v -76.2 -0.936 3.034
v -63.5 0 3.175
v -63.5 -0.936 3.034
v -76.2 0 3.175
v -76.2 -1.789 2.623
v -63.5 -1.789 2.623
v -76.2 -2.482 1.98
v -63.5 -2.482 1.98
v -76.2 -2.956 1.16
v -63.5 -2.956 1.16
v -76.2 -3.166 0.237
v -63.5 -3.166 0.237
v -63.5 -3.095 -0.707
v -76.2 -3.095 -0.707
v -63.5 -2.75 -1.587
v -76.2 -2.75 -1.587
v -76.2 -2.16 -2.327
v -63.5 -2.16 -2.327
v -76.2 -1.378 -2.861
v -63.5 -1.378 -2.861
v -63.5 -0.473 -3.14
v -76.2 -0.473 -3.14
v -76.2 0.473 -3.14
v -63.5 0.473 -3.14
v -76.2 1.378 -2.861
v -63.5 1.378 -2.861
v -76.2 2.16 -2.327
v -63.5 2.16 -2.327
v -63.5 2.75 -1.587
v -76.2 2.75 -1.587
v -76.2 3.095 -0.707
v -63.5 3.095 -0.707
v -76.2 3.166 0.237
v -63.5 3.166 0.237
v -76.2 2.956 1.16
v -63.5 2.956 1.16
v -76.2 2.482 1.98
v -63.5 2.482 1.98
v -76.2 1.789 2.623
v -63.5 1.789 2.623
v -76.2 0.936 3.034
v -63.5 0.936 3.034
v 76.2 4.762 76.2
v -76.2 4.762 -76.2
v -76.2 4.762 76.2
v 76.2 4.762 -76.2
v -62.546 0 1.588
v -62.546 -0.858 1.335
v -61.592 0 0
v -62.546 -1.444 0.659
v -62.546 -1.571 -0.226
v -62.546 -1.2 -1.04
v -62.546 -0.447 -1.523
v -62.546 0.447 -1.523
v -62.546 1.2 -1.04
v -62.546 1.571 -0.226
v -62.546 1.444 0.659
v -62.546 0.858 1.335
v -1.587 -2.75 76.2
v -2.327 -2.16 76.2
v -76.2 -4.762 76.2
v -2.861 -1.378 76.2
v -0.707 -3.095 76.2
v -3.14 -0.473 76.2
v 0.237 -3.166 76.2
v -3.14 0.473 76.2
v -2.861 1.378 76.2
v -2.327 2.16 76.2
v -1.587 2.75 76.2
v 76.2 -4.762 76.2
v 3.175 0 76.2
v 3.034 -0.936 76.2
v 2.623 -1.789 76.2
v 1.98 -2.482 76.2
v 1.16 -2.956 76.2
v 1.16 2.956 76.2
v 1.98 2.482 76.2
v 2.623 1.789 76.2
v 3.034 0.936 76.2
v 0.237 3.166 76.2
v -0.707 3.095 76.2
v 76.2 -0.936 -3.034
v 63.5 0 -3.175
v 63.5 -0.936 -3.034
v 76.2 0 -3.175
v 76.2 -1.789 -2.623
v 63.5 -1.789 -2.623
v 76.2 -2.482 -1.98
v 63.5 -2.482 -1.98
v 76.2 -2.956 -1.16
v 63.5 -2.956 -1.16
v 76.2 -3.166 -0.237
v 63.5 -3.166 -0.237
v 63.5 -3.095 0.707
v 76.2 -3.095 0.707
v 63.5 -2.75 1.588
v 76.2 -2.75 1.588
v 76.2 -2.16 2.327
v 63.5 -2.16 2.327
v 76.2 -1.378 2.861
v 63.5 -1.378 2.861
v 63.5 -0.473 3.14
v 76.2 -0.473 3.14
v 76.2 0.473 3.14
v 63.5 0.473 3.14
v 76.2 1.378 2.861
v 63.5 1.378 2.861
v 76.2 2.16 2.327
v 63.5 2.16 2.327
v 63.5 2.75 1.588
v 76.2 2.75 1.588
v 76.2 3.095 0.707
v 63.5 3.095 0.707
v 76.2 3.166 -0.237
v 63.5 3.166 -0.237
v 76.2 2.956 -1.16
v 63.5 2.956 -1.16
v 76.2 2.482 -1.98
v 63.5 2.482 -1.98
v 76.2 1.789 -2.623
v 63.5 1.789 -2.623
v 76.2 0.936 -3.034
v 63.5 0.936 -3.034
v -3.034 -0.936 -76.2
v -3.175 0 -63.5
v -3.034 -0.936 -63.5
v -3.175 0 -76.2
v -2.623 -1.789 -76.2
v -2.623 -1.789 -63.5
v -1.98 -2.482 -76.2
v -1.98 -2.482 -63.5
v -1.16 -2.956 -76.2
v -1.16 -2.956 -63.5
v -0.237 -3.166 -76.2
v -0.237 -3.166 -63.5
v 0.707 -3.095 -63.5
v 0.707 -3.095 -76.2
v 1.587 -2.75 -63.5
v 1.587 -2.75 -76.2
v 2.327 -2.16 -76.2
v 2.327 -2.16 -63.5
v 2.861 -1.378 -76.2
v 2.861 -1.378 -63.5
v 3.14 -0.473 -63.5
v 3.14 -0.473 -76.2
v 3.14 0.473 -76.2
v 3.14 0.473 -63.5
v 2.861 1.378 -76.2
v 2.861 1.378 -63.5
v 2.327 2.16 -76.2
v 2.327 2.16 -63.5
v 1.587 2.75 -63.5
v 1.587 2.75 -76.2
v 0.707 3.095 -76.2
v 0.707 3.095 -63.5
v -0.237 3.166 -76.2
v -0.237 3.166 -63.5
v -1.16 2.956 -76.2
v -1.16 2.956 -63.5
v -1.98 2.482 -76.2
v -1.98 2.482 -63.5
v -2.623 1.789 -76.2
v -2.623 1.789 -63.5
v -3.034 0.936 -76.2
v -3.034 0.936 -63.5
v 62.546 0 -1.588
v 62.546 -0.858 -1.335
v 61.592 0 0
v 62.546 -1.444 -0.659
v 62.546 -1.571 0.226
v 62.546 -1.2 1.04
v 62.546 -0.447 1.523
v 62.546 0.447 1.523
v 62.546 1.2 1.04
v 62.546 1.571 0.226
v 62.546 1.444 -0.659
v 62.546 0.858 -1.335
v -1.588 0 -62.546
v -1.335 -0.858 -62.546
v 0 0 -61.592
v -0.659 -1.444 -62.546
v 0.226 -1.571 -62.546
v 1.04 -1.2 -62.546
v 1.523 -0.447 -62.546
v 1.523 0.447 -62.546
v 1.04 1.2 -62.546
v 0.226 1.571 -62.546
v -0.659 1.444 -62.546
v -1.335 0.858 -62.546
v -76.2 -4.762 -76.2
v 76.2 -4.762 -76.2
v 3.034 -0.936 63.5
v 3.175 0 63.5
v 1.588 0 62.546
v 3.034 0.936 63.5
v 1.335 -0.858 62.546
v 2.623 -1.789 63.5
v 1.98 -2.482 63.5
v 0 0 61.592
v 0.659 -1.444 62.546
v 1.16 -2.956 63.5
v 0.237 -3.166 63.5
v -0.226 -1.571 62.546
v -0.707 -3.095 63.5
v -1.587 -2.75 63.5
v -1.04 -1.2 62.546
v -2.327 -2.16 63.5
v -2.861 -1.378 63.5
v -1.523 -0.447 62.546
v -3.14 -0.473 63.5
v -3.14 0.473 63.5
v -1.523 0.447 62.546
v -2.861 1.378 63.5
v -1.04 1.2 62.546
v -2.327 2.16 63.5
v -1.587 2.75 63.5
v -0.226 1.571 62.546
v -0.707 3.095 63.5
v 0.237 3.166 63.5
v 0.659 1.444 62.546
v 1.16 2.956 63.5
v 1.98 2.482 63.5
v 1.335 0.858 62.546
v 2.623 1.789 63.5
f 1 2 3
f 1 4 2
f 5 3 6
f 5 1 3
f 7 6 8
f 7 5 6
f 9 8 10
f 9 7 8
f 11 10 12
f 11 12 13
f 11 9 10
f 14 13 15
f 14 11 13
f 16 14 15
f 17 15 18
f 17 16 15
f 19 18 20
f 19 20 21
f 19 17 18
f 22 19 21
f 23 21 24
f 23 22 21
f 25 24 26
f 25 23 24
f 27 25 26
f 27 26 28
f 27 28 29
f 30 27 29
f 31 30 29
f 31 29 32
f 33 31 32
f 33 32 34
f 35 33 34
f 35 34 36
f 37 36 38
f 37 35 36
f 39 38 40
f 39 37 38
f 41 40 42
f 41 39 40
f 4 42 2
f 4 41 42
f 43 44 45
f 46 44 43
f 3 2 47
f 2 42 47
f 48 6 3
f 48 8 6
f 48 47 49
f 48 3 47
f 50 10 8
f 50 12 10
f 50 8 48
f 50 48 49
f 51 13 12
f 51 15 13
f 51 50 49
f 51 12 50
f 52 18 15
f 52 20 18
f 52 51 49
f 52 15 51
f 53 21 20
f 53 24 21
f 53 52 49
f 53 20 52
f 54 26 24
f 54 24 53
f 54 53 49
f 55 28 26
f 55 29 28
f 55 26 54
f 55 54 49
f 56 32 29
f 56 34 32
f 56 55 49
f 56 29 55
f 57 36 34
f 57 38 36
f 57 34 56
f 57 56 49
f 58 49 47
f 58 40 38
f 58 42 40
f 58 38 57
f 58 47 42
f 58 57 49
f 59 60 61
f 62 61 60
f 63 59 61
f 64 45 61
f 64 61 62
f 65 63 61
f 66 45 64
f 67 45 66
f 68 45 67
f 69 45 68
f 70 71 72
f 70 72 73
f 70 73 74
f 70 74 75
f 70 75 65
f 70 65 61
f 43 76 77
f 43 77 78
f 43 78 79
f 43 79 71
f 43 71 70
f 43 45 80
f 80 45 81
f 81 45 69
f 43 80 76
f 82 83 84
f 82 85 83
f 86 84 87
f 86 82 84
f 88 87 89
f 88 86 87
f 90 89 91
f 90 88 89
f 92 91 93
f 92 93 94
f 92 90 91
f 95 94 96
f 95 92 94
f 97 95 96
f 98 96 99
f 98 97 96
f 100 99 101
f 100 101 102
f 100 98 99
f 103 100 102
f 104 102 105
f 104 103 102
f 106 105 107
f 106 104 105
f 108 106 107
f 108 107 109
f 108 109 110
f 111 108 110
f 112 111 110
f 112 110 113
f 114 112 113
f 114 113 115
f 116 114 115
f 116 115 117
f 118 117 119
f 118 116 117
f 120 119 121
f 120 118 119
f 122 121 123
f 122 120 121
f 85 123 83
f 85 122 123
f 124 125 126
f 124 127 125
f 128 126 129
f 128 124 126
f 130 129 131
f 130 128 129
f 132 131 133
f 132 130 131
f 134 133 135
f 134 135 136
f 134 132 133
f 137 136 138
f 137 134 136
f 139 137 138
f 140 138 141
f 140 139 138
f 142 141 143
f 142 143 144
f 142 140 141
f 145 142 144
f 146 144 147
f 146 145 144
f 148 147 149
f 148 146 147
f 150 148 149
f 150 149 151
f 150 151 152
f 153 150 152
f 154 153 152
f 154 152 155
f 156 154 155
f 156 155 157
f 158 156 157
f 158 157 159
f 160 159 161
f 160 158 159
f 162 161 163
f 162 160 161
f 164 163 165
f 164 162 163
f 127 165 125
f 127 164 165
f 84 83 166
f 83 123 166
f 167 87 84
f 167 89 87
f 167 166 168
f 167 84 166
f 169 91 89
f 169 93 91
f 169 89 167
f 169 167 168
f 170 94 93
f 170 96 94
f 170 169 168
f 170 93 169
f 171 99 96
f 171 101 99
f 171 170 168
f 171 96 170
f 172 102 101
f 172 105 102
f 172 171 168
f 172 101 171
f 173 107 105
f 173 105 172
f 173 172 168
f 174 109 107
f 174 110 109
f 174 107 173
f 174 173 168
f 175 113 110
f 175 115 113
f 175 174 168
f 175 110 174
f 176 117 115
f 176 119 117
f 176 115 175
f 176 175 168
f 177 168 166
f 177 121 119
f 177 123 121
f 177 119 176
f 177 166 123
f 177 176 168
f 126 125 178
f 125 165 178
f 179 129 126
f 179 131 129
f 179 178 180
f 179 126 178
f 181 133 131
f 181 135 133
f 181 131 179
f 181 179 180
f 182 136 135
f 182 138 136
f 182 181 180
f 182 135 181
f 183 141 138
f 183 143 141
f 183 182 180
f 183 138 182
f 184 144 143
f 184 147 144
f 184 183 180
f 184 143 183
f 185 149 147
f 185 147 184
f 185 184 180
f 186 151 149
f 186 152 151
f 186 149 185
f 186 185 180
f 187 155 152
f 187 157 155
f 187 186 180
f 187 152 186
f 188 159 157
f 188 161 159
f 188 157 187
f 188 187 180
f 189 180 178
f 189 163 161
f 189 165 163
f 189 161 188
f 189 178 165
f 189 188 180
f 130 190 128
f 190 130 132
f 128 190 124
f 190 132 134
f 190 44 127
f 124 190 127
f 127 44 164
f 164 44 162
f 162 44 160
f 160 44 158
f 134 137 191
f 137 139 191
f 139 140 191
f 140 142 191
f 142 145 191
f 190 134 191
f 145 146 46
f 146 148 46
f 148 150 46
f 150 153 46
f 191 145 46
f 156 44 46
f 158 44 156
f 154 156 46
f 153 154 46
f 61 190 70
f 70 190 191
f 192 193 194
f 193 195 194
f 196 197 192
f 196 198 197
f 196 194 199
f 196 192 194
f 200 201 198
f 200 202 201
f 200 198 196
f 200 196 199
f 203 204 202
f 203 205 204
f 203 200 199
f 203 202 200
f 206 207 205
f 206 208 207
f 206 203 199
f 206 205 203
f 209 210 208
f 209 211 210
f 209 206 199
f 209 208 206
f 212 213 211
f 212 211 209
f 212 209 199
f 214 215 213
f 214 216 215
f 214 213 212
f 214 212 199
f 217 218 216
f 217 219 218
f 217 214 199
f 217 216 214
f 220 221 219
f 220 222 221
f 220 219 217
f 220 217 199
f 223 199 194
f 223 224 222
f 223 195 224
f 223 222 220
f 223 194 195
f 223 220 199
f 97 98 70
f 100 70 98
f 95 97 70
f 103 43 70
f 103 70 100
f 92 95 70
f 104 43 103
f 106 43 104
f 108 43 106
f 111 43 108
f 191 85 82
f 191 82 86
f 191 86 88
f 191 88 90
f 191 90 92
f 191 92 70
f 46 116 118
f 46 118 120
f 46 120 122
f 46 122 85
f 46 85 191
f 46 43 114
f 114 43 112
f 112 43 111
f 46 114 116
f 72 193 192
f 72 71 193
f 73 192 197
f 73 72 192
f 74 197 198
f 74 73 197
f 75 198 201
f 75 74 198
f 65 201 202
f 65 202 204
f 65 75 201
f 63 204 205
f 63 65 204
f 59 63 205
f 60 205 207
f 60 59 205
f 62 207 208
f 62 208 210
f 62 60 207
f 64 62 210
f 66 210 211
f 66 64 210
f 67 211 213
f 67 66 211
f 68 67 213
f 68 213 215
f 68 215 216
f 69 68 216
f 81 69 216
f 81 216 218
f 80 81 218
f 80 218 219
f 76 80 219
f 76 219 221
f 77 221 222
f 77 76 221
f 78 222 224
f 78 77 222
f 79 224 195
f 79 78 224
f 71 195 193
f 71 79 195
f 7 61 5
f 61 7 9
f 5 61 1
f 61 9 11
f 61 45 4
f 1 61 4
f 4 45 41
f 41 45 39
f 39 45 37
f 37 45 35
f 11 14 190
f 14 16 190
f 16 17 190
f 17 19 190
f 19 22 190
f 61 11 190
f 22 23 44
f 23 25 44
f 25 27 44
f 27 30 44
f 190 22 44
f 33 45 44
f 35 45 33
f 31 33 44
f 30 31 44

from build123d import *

# Parameters (mm, degrees)
SKETCH1_W           = 152.4
SKETCH1_H           = 152.4
BOSS_EXTRUDE1_DEPTH = 4.7625
CIRPATTERN1_COUNT   = 4


with BuildPart() as part:
    # Sketch1 → Boss-Extrude1 (new, symmetric)
    with BuildSketch(Plane(origin=(0, 0, 0), x_dir=(1, 0, 0), z_dir=(0, 1, 0))):
        Rectangle(SKETCH1_W, SKETCH1_H)
    extrude(amount=BOSS_EXTRUDE1_DEPTH, both=True)

    # Sketch3 → 1/4 (0.25) Diameter Hole1 (revolve, cut)
    with BuildSketch(Plane(origin=(76.2, 0, 0), x_dir=(0, 0, -1), z_dir=(0, 1, 0))):
        Polygon((0, 0), (0, 14.607732465), (3.175, 12.7), (3.175, 0), align=None)
    f_1_4_0_25_diameter_hole1 = revolve(axis=Axis((82.55, 0, 0), (-1, 0, 0)), mode=Mode.SUBTRACT)

    # CirPattern1: 1/4 (0.25) Diameter Hole1 ×4 about axis
    cirpattern1_axis = Axis((0, 4.7625, 0), (0, 1, 0))
    for i in range(1, CIRPATTERN1_COUNT):
        add(f_1_4_0_25_diameter_hole1.rotate(cirpattern1_axis, i * 360 / CIRPATTERN1_COUNT), mode=Mode.SUBTRACT)


solid = part.part
